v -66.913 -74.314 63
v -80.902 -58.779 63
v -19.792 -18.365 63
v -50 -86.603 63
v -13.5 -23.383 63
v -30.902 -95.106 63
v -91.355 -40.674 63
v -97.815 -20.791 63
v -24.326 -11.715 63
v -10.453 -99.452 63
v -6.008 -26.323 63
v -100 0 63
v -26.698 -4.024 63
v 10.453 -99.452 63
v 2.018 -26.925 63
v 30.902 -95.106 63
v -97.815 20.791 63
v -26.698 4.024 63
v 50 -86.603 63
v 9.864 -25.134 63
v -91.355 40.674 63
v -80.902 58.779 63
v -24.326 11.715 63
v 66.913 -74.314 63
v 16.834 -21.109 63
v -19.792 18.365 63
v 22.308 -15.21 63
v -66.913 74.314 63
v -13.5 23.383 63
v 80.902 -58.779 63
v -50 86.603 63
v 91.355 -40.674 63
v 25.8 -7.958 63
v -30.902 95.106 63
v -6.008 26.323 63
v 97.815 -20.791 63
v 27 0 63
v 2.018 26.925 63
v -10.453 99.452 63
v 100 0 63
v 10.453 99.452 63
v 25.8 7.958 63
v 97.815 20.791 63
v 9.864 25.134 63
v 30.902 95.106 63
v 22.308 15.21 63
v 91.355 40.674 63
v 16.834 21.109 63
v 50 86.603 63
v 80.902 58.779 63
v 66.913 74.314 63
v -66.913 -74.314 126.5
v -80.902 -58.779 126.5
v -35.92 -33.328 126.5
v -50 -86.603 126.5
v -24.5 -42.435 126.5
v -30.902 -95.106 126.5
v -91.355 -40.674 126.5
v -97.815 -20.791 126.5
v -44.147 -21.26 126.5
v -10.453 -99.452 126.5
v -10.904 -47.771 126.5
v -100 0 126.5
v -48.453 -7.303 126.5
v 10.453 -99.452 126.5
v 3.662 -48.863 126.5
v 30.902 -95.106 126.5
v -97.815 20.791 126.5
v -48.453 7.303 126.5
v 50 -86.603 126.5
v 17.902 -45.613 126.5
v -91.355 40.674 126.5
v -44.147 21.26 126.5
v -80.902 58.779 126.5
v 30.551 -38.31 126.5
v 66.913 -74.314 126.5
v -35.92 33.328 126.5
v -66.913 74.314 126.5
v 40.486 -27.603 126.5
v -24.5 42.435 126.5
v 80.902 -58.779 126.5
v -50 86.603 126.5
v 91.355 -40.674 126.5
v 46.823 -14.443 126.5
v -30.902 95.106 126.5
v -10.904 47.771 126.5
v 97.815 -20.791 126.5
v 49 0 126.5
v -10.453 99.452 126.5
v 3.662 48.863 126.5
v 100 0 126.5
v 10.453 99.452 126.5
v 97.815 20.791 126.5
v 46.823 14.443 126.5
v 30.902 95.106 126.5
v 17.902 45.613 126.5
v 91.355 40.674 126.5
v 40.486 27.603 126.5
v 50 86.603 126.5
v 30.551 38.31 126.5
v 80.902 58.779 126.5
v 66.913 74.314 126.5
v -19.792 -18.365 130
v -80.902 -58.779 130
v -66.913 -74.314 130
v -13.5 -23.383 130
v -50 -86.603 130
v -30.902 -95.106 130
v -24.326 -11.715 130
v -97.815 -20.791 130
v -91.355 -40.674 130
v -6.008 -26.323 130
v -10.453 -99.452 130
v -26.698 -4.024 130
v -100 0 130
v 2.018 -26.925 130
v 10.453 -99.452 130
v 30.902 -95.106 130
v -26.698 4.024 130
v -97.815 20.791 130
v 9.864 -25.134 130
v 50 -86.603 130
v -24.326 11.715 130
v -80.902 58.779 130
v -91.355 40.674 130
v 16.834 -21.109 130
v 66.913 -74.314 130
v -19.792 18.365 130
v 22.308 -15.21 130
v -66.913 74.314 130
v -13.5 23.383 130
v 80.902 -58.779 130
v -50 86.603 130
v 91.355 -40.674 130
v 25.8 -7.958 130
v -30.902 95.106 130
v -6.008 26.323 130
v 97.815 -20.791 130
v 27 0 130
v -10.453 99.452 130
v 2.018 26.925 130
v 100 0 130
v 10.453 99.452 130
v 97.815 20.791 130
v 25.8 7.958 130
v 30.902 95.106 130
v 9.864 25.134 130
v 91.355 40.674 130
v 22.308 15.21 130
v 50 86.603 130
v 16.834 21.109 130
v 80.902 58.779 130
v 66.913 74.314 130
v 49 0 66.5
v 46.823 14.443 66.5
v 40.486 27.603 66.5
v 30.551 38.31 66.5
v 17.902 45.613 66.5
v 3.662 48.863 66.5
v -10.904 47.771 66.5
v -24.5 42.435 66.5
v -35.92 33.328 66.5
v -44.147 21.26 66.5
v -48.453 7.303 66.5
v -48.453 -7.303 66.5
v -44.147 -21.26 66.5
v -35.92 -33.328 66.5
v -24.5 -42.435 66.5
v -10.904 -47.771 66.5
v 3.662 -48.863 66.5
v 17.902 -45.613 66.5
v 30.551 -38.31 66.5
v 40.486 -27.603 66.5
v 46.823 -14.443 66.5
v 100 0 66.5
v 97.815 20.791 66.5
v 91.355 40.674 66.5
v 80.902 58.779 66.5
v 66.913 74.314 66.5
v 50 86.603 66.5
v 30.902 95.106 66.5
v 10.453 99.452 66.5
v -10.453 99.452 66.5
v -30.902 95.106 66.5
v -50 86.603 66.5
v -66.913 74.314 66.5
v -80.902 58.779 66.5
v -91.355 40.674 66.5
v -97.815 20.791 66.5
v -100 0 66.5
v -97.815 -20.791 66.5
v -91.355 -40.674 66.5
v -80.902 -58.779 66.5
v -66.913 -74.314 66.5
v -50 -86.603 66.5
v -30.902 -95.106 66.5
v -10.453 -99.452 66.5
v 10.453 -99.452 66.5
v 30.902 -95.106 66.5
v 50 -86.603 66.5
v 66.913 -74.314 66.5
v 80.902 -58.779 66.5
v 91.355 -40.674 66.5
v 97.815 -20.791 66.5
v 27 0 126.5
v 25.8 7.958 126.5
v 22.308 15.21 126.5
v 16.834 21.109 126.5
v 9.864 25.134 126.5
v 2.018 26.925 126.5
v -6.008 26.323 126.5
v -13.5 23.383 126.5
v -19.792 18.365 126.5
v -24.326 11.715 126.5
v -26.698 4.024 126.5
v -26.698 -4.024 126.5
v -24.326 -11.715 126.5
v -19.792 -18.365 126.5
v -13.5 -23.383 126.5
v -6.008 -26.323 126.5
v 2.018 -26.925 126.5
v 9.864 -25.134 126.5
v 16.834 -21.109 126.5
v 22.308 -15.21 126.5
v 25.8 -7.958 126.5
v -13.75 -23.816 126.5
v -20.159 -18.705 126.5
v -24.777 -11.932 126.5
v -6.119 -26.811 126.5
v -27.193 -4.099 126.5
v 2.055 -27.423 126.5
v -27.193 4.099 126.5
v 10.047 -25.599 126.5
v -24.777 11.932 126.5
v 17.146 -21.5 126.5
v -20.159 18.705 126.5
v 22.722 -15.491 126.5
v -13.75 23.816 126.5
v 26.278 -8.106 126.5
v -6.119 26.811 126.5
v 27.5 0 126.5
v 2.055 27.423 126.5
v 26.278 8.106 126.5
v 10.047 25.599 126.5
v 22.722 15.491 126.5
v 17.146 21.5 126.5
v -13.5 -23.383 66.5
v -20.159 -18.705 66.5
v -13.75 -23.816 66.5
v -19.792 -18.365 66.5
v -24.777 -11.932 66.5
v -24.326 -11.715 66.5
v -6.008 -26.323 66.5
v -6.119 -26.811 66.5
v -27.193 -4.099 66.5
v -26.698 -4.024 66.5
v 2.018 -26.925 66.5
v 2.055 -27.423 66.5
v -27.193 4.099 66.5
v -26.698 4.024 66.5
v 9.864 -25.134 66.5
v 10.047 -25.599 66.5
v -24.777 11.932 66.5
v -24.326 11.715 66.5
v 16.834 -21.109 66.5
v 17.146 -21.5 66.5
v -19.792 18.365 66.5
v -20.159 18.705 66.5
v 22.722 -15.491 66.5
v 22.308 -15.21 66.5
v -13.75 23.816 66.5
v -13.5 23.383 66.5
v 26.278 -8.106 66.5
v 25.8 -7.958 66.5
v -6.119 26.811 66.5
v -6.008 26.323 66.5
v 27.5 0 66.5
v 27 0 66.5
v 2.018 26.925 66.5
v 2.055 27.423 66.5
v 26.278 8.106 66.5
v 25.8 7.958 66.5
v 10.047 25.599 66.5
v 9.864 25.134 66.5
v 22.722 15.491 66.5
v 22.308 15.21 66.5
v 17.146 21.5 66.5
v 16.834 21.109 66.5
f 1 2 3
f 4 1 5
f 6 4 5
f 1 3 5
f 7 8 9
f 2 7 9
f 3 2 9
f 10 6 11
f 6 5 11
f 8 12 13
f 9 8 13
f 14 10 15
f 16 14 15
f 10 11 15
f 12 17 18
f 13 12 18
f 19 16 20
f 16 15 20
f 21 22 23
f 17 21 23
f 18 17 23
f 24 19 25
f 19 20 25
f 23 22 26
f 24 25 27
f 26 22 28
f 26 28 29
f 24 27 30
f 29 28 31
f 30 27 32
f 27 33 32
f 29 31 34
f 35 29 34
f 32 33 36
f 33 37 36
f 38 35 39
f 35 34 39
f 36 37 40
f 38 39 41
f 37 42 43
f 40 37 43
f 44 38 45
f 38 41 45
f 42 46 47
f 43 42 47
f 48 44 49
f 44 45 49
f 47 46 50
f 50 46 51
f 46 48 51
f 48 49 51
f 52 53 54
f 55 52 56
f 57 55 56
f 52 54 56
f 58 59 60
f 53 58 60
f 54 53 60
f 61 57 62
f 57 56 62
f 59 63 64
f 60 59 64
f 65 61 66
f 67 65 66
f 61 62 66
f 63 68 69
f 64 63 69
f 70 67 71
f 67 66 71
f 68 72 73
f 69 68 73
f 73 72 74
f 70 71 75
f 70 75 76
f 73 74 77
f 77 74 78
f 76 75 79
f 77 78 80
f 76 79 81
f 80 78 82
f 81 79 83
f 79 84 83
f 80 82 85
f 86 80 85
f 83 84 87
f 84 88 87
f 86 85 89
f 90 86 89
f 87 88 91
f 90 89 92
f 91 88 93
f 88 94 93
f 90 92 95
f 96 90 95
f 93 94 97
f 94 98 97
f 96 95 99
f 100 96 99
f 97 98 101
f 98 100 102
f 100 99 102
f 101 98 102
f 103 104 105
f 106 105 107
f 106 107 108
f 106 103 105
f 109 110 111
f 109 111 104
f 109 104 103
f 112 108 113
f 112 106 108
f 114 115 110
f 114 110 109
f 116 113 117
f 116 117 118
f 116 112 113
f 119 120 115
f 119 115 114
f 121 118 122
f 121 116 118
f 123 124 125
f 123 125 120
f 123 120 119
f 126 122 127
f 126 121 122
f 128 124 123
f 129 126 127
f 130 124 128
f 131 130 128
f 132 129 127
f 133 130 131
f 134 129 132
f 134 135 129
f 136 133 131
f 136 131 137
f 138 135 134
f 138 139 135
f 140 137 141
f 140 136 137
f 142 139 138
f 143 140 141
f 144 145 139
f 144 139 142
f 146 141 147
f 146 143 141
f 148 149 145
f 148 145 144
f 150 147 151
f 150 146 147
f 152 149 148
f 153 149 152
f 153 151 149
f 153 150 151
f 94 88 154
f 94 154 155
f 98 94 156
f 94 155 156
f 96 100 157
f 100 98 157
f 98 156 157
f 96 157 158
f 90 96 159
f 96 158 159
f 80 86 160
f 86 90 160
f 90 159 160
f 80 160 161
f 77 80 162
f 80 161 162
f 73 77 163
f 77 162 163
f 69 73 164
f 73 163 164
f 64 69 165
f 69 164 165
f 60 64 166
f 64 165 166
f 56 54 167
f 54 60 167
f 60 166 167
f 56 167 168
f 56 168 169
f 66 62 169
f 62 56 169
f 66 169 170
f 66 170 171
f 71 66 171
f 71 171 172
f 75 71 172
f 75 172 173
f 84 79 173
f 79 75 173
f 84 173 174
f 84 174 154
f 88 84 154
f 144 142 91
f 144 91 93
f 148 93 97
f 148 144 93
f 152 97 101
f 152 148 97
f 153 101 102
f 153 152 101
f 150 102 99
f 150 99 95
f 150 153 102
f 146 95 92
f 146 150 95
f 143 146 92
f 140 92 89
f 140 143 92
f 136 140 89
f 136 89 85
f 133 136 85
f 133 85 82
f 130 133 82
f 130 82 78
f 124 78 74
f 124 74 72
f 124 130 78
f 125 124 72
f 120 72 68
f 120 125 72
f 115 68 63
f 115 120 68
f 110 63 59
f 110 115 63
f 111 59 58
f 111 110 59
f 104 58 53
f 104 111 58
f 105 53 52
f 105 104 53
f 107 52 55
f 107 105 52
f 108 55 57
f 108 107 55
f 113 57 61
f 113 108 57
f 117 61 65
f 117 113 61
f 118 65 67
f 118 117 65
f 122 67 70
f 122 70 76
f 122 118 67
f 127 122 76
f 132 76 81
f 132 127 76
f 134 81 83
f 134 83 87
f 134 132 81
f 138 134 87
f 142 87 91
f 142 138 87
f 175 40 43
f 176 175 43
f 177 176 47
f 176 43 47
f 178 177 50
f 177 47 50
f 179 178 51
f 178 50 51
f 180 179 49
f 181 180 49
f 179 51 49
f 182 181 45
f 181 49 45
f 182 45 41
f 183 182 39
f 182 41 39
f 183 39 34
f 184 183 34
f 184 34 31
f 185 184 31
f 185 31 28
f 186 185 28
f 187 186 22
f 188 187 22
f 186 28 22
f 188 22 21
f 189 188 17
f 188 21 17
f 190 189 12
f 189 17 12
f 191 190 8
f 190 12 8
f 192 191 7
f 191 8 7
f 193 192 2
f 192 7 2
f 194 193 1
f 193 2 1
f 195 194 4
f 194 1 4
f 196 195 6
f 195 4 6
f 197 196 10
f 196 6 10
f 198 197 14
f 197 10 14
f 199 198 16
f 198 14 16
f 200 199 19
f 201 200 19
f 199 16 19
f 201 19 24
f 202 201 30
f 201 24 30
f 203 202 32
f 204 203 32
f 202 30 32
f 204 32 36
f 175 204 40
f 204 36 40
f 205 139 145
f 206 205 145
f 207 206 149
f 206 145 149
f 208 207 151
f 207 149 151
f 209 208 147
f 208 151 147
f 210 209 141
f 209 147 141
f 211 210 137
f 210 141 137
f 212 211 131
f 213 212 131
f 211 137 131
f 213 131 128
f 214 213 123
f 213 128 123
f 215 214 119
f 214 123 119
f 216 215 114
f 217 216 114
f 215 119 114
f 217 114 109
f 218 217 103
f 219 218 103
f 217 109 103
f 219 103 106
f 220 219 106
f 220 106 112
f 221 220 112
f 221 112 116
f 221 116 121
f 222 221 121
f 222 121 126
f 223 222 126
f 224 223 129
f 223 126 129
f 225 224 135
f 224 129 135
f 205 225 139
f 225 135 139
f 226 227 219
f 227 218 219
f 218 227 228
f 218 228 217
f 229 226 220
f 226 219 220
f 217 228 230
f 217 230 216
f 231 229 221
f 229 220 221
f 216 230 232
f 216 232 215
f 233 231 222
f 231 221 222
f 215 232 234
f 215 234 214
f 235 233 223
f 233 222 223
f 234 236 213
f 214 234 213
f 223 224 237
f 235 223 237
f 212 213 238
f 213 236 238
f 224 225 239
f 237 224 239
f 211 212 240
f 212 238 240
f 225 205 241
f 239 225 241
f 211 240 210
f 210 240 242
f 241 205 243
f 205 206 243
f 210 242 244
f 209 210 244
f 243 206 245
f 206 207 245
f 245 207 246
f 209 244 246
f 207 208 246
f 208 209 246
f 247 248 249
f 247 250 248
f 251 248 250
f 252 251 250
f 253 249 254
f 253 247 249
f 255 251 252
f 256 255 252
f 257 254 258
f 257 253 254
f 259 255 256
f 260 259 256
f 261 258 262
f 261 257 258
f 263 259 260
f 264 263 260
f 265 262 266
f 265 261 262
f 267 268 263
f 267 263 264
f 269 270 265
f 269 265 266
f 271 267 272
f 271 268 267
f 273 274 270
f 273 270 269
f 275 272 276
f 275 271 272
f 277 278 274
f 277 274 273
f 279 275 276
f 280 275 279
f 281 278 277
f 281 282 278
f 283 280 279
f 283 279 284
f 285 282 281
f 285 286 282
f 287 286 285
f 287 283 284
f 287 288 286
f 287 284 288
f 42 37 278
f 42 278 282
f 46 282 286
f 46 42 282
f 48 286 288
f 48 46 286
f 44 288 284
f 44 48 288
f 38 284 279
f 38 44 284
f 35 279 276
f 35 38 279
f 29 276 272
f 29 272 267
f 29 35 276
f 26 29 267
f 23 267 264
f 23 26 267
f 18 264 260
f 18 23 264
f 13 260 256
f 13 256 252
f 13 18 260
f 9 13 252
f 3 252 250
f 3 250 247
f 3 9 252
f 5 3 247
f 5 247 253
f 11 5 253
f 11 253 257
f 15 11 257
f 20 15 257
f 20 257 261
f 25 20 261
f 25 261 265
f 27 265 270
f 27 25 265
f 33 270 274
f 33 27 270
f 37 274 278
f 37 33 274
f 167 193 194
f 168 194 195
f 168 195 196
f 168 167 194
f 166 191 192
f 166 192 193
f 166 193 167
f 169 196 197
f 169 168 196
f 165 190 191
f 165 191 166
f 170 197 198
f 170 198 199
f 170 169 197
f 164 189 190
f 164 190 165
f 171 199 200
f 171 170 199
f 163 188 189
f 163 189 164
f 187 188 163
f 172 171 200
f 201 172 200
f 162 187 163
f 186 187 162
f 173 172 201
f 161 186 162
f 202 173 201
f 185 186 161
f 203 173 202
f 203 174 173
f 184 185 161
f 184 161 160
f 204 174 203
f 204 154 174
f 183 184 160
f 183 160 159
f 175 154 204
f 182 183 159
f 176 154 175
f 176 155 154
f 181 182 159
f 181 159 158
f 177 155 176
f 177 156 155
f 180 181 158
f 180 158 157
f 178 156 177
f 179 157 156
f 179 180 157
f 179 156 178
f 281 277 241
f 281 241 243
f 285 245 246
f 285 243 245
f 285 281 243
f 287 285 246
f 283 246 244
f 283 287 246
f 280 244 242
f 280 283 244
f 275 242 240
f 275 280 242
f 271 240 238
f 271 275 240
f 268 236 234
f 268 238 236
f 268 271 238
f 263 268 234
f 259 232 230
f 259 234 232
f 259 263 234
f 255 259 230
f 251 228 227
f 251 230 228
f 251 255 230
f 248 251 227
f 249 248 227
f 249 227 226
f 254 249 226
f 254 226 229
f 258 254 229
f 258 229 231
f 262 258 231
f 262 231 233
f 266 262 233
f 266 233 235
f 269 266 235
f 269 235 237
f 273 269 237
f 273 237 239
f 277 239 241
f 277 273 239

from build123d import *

# Parameters (mm, degrees)
SKETCH037_R   = 49
SKETCH037_R_2 = 27.5
PAD028_DEPTH  = 67
SKETCH035_R   = 100
SKETCH035_R_2 = 27
PAD026_DEPTH  = 3.5
SKETCH036_R   = 100
SKETCH036_R_2 = 27
PAD027_DEPTH  = 3.5


with BuildPart() as part:
    # Sketch037 → Pad028 (new body)
    with BuildSketch(Plane.XY):
        Circle(SKETCH037_R)
        Circle(SKETCH037_R_2, mode=Mode.SUBTRACT)
    extrude(amount=PAD028_DEPTH)

    # Sketch035 → Pad026 (join)
    with BuildSketch(Plane.XY):
        Circle(SKETCH035_R)
        Circle(SKETCH035_R_2, mode=Mode.SUBTRACT)
    extrude(amount=PAD026_DEPTH)

    # Sketch036 → Pad027 (join)
    with BuildSketch(Plane.XY.offset(67)):
        Circle(SKETCH036_R)
        Circle(SKETCH036_R_2, mode=Mode.SUBTRACT)
    extrude(amount=-PAD027_DEPTH)


with BuildPart() as part_1:
    # Body008 placement: moved
    add(part.part.moved(Location((0, 0, 63))))


solid = part_1.part
